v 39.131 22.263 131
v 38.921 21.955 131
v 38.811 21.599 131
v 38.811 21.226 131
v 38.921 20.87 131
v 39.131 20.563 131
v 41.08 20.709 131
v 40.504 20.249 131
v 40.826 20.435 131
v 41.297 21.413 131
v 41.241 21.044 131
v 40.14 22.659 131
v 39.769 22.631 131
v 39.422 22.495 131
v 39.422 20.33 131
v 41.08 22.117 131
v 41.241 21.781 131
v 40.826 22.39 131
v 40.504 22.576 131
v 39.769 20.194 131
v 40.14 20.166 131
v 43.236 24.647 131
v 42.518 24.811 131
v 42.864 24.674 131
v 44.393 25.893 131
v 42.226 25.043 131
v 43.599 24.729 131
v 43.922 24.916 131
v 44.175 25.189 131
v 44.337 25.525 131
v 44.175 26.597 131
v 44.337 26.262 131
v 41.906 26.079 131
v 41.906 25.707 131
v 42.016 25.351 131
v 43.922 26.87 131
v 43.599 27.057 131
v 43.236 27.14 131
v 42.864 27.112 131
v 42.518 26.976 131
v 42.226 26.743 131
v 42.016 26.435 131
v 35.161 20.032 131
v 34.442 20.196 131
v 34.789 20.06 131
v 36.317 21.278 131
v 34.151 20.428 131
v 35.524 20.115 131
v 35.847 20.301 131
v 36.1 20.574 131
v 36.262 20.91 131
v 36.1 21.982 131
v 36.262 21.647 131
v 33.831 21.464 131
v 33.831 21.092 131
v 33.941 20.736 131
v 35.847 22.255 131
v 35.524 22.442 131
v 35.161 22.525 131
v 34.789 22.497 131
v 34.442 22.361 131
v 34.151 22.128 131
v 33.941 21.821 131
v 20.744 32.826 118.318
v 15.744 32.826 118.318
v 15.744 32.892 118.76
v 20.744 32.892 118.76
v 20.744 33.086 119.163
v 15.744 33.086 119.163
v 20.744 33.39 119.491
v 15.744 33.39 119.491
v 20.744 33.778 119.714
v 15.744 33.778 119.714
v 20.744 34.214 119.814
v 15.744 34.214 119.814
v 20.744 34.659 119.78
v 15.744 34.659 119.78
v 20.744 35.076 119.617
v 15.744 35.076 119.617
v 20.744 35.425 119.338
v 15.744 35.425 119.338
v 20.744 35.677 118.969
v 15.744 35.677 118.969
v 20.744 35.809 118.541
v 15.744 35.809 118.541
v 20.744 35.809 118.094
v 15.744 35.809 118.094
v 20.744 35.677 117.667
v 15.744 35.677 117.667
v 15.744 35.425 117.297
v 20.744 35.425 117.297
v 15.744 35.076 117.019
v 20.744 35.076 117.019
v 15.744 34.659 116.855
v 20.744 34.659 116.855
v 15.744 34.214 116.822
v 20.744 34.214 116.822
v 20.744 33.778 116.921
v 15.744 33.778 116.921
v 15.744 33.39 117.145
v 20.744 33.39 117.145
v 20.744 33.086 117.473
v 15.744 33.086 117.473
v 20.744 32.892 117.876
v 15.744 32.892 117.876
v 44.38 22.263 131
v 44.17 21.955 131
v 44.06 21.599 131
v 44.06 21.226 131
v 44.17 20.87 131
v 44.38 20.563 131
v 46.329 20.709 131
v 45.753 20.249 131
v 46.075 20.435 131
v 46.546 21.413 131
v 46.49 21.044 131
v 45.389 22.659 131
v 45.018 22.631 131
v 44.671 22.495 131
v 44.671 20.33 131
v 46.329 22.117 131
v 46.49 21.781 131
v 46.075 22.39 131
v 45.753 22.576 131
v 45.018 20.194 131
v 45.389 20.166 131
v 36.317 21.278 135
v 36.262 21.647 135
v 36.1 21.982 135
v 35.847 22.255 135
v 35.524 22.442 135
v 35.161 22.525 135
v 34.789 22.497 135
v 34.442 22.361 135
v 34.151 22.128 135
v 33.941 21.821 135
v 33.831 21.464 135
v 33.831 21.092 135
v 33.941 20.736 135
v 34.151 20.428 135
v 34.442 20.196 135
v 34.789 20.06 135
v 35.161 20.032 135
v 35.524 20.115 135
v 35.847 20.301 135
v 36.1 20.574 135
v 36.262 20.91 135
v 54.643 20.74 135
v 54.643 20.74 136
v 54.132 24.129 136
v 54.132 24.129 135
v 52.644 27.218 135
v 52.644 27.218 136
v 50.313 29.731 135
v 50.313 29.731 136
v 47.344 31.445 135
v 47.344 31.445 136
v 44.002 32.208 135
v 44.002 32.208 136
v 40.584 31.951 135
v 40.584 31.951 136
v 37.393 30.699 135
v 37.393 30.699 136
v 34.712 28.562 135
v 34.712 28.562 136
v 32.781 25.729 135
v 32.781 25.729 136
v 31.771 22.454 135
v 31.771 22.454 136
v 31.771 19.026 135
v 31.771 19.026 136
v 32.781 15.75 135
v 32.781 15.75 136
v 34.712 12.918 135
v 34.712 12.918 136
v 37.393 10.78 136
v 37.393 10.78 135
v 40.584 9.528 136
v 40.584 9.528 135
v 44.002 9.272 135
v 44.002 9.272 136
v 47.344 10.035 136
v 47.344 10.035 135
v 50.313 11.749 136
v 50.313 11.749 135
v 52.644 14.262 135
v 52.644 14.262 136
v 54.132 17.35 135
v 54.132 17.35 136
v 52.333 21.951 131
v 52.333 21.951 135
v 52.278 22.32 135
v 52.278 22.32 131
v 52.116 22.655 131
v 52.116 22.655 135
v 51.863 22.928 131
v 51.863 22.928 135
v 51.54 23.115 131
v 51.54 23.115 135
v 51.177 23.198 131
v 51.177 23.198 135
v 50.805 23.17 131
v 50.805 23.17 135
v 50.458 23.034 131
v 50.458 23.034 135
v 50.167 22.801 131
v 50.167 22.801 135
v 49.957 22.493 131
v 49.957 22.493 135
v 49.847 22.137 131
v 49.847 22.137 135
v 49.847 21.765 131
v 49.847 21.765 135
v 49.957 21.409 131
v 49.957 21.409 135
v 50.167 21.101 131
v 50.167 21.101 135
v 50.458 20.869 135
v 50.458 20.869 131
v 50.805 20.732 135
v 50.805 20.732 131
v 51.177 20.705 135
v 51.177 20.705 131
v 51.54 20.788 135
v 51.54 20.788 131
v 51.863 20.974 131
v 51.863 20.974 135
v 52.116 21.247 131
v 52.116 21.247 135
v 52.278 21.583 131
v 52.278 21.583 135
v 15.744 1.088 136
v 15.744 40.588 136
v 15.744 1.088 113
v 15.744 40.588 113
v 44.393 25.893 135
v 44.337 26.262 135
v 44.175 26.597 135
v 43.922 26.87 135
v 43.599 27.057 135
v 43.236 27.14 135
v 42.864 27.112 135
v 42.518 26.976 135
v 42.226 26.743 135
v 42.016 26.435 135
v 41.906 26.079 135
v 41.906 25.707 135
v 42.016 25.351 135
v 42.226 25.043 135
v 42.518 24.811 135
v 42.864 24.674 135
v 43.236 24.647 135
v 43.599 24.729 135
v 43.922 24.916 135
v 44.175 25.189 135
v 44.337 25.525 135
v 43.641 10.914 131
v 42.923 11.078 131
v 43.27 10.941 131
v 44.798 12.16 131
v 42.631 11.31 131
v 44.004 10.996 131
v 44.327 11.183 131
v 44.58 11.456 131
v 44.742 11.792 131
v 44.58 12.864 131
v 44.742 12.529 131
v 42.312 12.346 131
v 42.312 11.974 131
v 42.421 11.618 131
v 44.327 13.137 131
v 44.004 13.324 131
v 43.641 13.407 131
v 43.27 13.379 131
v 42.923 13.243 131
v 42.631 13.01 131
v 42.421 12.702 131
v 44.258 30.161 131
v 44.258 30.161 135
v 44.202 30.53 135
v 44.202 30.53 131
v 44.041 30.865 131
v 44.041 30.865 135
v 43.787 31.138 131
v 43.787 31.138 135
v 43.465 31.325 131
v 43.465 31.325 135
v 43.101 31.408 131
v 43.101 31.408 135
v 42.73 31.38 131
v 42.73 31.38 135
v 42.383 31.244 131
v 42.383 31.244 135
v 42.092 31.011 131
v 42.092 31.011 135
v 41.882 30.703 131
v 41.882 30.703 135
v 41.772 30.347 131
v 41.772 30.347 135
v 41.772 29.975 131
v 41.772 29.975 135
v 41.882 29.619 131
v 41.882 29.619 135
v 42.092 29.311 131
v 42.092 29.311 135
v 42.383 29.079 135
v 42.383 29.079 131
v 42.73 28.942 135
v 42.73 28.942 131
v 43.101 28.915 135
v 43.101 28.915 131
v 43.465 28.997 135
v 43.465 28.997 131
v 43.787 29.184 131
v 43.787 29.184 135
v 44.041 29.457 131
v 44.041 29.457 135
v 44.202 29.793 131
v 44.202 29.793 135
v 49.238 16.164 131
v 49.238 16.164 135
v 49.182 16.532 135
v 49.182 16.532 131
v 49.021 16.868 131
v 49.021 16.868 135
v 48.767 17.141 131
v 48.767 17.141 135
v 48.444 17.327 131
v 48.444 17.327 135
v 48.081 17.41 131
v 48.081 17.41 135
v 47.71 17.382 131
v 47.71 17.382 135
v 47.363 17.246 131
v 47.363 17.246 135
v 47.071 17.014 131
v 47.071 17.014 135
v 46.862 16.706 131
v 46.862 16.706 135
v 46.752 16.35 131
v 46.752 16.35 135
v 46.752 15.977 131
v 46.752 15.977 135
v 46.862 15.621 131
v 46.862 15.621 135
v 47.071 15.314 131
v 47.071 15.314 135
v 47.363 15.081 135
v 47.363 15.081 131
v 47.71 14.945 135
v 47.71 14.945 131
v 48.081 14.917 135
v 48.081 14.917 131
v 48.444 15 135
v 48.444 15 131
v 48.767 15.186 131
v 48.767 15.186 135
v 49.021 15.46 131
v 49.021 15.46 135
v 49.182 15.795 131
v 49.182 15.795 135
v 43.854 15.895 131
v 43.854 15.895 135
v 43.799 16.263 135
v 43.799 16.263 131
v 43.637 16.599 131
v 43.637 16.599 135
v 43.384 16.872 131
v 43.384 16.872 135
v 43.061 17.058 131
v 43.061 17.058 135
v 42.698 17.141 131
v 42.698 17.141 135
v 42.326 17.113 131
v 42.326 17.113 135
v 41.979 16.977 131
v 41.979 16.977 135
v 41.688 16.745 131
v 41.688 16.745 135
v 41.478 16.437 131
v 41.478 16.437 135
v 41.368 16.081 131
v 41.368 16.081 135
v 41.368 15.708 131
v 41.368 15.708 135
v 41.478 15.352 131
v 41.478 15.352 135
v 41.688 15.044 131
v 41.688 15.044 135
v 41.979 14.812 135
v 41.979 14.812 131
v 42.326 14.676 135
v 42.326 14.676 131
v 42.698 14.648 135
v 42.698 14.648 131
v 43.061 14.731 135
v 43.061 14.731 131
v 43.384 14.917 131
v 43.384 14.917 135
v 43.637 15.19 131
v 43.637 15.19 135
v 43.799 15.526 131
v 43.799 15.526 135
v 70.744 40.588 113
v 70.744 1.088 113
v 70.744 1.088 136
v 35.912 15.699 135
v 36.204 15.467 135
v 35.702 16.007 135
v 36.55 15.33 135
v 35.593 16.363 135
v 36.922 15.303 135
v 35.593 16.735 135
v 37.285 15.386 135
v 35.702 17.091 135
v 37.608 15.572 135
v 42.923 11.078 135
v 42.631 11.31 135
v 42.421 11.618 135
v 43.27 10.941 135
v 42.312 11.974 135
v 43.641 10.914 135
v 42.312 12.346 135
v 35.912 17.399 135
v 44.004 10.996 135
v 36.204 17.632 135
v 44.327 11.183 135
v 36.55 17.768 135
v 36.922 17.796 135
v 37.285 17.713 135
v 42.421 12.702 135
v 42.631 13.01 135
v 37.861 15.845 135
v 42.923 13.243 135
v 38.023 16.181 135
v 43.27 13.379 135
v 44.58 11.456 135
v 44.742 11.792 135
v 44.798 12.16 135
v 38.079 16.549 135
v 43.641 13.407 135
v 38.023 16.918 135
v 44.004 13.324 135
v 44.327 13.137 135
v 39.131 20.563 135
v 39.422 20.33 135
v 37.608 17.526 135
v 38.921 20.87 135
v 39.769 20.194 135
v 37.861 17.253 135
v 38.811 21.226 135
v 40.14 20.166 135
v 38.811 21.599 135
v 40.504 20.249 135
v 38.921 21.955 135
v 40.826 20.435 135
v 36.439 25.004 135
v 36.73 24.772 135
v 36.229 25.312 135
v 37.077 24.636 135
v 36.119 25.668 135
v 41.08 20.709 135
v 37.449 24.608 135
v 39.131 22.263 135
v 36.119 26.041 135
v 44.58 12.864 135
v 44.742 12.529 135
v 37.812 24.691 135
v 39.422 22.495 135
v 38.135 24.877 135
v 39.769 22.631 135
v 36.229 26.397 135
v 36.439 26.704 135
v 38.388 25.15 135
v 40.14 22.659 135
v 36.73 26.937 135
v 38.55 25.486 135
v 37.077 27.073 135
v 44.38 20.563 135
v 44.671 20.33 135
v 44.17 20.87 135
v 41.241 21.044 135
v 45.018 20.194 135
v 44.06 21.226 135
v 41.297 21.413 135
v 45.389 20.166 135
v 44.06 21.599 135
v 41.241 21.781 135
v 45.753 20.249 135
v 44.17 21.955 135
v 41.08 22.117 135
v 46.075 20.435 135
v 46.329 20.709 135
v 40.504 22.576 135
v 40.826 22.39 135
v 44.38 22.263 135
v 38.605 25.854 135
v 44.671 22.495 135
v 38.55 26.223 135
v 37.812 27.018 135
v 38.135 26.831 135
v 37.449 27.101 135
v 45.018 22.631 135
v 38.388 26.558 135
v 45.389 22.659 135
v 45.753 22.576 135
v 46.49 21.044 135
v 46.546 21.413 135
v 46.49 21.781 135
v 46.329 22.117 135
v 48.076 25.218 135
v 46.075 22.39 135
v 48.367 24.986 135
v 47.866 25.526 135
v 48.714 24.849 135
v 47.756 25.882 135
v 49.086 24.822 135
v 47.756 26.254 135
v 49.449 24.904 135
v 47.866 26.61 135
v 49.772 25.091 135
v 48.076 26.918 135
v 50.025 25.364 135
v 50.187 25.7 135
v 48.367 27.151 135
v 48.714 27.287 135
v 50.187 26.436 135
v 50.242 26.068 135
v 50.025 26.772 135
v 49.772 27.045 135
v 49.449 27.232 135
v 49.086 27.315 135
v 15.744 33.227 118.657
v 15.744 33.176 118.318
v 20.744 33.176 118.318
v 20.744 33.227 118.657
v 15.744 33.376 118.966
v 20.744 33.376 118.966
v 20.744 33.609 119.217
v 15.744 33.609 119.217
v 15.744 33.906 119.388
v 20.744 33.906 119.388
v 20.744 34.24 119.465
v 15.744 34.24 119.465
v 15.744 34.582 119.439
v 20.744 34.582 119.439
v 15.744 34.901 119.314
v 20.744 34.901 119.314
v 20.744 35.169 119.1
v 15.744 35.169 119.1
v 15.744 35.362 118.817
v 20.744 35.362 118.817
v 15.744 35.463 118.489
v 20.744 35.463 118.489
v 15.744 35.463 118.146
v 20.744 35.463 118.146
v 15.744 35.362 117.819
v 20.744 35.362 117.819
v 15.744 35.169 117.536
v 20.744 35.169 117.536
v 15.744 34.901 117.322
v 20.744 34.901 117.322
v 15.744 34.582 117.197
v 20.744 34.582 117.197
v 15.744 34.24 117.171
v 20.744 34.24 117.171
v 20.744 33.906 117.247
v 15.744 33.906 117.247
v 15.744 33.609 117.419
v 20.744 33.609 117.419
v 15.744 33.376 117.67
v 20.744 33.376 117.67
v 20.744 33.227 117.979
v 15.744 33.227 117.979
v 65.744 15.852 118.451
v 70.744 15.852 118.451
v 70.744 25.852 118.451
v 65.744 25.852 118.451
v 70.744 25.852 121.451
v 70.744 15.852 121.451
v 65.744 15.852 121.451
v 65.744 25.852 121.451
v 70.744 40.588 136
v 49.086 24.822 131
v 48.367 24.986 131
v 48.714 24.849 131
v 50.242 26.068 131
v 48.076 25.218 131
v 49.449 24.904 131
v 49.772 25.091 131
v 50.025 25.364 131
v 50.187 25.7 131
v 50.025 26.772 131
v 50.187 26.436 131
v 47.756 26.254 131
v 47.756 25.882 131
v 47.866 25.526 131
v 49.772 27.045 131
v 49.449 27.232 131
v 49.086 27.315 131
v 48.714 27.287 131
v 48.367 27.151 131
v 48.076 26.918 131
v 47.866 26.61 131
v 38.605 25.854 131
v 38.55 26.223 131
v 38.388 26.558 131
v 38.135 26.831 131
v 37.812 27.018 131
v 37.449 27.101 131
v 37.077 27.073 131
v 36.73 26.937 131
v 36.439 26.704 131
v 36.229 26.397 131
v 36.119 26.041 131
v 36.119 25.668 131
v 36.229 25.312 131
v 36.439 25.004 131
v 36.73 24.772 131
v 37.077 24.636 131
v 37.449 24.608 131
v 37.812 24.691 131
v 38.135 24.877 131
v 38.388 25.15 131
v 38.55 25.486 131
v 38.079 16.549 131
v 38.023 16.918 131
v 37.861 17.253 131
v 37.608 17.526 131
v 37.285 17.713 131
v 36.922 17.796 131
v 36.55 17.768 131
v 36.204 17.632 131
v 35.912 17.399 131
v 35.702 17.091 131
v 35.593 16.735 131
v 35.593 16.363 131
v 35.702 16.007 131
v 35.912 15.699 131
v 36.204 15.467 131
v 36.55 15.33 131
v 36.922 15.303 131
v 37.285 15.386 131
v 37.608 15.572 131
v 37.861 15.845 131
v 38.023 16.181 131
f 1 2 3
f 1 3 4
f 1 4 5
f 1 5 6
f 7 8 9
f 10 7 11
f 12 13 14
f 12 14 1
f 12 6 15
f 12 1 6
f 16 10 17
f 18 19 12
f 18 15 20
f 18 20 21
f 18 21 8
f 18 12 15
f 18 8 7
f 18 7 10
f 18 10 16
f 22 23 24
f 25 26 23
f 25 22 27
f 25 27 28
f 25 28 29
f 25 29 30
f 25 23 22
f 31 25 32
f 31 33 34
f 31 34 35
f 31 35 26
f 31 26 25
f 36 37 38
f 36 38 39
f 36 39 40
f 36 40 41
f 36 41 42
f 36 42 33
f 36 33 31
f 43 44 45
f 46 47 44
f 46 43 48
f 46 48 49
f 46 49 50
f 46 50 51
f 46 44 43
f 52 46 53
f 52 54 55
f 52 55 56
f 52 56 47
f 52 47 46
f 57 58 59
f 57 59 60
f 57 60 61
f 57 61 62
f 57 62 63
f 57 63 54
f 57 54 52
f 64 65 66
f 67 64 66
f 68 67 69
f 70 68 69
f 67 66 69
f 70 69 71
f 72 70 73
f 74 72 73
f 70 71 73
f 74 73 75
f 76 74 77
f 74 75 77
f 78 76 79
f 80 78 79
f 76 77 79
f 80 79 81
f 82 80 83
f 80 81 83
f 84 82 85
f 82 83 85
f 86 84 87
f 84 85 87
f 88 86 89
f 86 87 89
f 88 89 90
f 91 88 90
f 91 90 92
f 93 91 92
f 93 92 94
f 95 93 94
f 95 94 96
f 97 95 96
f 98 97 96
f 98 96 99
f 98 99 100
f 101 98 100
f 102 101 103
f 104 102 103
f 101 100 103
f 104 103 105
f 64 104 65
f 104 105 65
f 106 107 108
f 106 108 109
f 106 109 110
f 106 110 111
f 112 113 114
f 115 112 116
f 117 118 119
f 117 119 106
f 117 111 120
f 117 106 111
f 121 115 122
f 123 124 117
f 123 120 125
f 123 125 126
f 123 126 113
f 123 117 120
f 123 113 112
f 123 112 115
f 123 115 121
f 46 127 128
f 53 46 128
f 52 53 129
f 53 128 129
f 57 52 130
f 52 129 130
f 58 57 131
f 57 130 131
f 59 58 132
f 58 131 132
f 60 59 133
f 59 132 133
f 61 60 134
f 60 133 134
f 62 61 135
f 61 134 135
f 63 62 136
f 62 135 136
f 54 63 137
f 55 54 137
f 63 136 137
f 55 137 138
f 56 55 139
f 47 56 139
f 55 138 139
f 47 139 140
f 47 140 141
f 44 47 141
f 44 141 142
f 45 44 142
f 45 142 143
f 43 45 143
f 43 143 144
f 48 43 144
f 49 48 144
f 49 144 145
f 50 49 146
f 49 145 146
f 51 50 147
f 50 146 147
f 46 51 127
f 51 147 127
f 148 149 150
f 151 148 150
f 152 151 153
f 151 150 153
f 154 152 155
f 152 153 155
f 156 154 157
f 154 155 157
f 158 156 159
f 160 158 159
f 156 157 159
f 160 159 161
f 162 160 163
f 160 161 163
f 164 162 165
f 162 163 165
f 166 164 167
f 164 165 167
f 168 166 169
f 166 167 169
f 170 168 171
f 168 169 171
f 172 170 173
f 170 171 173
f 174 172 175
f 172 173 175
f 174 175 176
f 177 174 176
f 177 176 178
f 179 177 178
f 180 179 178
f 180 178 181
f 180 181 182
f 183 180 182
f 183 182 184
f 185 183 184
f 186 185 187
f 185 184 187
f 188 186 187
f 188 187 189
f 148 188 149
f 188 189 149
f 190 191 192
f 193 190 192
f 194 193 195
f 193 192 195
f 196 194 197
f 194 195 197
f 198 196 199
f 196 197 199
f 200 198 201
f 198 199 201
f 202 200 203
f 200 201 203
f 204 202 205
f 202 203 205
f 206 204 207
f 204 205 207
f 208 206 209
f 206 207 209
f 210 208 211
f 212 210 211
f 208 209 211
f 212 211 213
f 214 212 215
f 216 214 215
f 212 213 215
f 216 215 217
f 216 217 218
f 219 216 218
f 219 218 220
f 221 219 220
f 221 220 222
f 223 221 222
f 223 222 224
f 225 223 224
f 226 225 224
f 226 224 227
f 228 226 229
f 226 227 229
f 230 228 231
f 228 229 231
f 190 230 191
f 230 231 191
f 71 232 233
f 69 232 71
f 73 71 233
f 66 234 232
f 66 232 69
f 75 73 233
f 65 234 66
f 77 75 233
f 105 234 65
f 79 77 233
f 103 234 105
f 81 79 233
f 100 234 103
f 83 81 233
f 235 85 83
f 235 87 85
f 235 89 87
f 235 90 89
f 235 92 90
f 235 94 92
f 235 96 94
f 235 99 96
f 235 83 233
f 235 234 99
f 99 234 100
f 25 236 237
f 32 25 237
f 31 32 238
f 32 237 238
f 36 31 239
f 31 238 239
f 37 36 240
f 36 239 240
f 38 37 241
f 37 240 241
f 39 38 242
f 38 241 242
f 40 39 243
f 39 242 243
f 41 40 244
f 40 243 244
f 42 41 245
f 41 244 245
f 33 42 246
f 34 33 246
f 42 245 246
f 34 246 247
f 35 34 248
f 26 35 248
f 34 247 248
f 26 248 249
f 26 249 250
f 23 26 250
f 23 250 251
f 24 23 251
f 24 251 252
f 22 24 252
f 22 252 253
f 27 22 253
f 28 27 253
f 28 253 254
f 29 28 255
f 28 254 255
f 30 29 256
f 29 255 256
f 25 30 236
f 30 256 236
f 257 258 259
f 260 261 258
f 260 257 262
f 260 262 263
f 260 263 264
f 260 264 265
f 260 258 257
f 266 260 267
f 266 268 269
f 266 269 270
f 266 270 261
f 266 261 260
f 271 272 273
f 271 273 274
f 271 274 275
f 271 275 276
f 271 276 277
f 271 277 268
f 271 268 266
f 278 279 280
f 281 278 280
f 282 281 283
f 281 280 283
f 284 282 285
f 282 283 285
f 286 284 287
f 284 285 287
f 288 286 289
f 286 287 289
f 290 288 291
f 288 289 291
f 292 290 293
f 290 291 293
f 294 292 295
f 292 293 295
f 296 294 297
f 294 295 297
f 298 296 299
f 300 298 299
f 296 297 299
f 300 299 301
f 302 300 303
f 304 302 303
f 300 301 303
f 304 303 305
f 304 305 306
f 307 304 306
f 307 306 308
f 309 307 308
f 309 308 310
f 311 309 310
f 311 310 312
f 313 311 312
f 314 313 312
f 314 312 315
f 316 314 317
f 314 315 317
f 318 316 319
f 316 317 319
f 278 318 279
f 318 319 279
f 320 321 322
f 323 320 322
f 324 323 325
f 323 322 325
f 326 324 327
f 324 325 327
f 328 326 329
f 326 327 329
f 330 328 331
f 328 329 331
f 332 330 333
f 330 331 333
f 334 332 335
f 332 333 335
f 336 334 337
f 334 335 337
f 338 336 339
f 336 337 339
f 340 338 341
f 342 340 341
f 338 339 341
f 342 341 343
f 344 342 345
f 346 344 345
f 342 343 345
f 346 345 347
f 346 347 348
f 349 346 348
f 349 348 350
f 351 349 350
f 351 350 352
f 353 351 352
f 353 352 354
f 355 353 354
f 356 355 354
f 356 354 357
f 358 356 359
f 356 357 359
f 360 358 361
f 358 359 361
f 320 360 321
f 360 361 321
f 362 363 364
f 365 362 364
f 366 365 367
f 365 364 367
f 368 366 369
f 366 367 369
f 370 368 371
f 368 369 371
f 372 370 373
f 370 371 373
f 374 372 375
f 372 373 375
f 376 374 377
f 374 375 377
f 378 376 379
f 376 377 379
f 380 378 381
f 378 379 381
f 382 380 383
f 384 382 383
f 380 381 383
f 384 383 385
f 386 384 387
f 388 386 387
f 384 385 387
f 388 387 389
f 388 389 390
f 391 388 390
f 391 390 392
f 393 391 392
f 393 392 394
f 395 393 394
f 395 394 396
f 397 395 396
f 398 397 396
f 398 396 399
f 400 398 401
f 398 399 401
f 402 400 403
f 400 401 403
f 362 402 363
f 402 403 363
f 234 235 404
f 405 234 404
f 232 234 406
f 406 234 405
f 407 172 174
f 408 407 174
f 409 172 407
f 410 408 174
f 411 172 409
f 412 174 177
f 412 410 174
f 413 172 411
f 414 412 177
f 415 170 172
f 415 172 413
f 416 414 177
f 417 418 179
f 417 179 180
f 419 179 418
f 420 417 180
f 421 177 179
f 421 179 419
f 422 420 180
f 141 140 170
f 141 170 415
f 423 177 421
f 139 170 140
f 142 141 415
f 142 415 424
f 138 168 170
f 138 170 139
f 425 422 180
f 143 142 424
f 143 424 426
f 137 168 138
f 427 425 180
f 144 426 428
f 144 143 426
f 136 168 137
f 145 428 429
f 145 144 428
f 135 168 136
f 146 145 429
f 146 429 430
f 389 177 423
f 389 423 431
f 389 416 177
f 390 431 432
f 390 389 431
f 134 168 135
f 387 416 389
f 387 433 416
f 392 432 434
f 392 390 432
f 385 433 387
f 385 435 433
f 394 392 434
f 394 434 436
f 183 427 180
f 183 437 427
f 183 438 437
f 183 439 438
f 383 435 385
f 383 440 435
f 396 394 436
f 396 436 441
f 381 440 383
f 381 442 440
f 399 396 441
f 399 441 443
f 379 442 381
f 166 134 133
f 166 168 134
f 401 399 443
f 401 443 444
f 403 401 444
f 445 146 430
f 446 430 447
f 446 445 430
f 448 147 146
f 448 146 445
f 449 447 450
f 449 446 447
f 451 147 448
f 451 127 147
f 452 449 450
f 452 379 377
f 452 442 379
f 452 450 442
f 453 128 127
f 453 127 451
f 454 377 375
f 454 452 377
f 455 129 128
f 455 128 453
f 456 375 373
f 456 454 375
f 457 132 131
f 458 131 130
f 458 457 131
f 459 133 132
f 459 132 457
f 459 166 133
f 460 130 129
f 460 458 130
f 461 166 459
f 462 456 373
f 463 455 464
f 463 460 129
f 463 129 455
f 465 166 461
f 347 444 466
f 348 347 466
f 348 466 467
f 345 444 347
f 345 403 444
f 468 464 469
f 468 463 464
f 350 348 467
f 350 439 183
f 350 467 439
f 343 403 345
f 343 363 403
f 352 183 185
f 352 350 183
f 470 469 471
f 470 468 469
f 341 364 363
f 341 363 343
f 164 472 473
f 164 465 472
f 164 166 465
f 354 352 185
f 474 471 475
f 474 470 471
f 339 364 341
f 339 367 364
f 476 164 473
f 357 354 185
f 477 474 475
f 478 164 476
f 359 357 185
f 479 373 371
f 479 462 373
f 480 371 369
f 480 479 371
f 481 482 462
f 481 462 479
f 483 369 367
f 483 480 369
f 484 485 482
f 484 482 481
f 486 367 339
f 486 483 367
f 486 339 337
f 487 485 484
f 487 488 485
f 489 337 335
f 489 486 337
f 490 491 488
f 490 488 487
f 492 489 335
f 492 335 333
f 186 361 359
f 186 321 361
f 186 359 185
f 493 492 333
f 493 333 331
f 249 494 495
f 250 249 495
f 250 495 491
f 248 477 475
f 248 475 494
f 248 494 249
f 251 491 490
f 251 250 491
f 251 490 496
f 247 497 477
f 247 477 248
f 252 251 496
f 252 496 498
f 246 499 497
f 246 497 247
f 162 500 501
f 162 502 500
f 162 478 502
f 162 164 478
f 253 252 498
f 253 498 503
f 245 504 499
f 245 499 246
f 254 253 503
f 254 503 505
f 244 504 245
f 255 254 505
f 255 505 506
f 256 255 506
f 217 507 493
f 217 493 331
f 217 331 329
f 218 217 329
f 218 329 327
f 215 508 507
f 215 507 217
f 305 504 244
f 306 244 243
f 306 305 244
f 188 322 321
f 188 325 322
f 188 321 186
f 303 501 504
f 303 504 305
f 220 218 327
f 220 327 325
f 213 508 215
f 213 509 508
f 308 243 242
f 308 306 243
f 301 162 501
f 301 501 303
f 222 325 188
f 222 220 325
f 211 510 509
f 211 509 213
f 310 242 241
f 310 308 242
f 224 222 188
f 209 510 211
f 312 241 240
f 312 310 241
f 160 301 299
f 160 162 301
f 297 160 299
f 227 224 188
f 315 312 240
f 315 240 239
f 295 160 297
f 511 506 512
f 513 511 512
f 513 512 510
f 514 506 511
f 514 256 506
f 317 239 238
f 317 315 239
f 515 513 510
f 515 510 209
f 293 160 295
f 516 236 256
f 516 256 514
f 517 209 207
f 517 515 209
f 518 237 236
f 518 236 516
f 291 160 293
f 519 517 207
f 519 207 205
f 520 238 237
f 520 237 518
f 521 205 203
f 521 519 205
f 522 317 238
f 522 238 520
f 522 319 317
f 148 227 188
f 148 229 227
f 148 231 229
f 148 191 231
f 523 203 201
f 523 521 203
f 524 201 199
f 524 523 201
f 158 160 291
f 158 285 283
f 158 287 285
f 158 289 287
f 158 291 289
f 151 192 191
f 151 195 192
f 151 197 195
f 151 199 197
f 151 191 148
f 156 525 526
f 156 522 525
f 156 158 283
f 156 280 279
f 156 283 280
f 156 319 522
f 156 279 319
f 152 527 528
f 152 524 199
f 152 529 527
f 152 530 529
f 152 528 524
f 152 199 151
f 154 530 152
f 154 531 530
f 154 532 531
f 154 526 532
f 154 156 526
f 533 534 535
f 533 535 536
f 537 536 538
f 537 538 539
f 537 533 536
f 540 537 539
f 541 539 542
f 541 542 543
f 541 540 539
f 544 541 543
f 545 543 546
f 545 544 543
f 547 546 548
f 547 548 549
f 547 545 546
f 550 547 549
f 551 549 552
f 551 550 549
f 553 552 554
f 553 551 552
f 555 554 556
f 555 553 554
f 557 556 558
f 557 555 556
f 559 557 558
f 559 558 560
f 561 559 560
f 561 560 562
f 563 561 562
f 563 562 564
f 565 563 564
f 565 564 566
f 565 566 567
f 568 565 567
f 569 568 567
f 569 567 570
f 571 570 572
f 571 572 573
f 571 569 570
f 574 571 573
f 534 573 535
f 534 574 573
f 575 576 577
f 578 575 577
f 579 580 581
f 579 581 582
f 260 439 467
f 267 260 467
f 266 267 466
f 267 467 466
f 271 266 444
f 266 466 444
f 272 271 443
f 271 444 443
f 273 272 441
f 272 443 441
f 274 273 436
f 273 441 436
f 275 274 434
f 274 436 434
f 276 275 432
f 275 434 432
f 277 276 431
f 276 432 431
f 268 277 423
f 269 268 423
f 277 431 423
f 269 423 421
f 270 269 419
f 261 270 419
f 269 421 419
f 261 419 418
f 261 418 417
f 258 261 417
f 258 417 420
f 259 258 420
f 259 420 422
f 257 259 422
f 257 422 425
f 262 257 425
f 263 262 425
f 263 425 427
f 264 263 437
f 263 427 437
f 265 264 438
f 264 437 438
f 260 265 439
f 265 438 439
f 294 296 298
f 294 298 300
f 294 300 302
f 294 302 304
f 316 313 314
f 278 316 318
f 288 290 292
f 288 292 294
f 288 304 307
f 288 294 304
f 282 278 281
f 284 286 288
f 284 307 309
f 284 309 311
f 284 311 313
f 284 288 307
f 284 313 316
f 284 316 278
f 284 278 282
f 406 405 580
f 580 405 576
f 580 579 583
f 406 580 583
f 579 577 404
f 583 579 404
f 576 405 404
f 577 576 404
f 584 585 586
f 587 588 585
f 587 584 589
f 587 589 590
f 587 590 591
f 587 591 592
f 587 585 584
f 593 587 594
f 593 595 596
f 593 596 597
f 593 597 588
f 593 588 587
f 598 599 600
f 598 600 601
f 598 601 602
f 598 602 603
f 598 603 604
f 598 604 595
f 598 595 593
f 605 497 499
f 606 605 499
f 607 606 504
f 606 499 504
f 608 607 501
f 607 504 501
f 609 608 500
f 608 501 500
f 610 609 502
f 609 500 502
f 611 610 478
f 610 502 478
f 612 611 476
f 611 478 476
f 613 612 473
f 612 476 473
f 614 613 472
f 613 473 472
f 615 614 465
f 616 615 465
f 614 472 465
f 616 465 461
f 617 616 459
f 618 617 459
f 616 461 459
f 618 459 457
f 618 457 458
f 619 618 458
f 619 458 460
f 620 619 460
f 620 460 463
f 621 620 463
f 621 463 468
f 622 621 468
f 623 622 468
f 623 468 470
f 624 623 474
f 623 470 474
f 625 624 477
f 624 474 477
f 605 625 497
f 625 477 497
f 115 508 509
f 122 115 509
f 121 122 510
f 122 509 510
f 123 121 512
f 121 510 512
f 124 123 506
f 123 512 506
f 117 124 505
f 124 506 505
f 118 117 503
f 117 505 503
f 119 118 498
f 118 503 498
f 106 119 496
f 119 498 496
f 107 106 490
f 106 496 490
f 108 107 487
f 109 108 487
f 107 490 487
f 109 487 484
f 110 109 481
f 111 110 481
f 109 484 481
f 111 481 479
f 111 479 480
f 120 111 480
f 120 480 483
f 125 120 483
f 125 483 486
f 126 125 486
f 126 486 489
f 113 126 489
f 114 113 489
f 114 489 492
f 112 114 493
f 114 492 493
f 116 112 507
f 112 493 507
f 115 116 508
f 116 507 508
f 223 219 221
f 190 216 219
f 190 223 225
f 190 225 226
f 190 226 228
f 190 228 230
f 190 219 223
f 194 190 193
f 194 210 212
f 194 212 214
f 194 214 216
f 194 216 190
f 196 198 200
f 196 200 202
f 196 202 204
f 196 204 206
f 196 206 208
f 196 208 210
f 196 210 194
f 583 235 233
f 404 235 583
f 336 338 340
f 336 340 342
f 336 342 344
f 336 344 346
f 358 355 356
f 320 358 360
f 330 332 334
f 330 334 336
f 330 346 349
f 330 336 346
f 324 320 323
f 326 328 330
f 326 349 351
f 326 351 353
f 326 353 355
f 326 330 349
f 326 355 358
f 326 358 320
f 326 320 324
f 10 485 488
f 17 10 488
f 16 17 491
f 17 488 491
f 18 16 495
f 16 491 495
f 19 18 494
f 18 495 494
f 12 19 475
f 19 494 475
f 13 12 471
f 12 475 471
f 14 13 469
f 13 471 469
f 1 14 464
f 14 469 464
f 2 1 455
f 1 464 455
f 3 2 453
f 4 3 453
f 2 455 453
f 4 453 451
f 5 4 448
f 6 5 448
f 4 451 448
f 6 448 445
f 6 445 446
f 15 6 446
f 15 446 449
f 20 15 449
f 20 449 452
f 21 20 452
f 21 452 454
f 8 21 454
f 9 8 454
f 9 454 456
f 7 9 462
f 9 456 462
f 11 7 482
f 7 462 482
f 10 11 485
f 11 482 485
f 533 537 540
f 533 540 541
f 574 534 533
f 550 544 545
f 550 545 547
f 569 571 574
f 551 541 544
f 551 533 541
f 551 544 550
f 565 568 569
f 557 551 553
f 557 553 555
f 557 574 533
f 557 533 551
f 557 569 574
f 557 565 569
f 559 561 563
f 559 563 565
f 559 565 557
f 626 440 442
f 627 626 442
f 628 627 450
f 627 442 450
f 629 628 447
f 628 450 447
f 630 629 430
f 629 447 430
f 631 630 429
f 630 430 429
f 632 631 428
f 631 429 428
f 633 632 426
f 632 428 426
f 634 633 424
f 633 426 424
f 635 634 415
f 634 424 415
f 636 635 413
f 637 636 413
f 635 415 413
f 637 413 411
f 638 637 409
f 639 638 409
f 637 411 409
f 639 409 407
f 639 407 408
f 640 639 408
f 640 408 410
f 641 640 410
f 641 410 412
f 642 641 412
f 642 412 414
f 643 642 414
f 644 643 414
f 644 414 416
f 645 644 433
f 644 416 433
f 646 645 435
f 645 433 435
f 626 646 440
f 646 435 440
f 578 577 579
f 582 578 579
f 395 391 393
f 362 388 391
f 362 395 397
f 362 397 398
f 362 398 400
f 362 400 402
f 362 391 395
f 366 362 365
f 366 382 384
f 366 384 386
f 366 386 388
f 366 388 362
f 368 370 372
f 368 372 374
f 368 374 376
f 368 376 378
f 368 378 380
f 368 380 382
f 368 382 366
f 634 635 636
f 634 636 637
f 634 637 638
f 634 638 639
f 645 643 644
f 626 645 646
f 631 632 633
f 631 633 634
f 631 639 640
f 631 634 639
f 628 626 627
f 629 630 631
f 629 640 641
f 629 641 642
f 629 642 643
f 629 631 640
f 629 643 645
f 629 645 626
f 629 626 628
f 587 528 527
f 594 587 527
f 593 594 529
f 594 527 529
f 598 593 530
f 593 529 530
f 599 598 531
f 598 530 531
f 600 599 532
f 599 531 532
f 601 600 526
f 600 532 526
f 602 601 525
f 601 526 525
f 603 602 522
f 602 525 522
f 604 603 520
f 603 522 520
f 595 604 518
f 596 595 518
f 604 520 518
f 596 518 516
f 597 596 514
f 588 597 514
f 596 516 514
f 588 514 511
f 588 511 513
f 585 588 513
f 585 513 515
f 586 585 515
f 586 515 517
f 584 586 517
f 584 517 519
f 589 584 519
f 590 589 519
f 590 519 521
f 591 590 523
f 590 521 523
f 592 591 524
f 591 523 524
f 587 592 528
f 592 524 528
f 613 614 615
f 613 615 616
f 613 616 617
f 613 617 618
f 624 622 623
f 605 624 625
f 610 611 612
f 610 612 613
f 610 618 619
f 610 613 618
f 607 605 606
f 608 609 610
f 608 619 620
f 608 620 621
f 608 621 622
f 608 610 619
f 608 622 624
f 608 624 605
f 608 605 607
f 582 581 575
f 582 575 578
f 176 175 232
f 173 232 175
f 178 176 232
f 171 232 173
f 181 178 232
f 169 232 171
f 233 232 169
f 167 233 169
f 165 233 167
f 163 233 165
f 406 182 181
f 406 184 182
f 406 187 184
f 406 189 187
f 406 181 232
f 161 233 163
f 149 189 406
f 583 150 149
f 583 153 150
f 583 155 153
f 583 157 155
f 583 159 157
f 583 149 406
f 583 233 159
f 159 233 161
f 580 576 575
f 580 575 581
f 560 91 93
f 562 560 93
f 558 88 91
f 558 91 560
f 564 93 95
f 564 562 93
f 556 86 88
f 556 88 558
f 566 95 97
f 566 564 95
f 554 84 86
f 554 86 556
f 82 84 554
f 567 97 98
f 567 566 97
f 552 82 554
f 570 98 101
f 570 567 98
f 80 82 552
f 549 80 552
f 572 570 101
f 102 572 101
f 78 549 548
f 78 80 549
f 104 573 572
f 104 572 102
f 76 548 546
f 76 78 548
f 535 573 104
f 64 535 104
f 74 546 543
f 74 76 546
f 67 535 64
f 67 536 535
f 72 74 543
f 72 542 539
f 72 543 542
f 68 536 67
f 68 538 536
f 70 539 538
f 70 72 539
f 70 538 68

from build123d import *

# Parameters (mm, degrees)
SKETCH057_W     = 55
SKETCH057_H     = 39.5
PAD028_DEPTH    = 23
SKETCH058_W     = 10
SKETCH058_H     = 3
POCKET011_DEPTH = 5
SKETCH059_R     = 11.5
POCKET012_DEPTH = 1
SKETCH060_R     = 1.25
POCKET013_DEPTH = 4
SKETCH061_R     = 1.5
SKETCH061_R_2   = 1.15
POCKET014_DEPTH = 5


with BuildPart() as part:
    # Sketch057 → Pad028 (new body)
    with BuildSketch(Plane.XY):
        with Locations((8.244135, 0.838188)):
            Rectangle(SKETCH057_W, SKETCH057_H)
    extrude(amount=PAD028_DEPTH)

    # Sketch058 (on Face3 of Pad028) → Pocket011 (cut)
    with BuildSketch(Plane.YZ.offset(35.744135)):
        with Locations((0.852094, 6.951404)):
            Rectangle(SKETCH058_W, SKETCH058_H)
    extrude(amount=-POCKET011_DEPTH, mode=Mode.SUBTRACT)

    # Sketch059 (on Face5 of Pocket011) → Pocket012 (cut)
    with BuildSketch(Plane.XY.offset(23)):
        with Locations((8.142509, 0.739769)):
            Circle(SKETCH059_R)
    extrude(amount=-POCKET012_DEPTH, mode=Mode.SUBTRACT)

    # Sketch060 (on Face12 of Pocket012) → Pocket013 (cut)
    with BuildSketch(Plane.XY.offset(22)):
        with Locations((2.355179, 5.854206)):
            Circle(SKETCH060_R)
        with Locations((8.142534, 5.893073)):
            Circle(SKETCH060_R)
        with Locations((13.992255, 6.068044)):
            Circle(SKETCH060_R)
        with Locations((0.067154, 1.278166)):
            Circle(SKETCH060_R)
        with Locations((5.046978, 1.412754)):
            Circle(SKETCH060_R)
        with Locations((10.295966, 1.412754)):
            Circle(SKETCH060_R)
        with Locations((1.82863, -3.450897)):
            Circle(SKETCH060_R)
        with Locations((7.604173, -4.105418)):
            Circle(SKETCH060_R)
        with Locations((12.987754, -3.836237)):
            Circle(SKETCH060_R)
        with Locations((8.547656, -7.839936)):
            Circle(SKETCH060_R)
        with Locations((8.00794, 10.161071)):
            Circle(SKETCH060_R)
        with Locations((16.083309, 1.951109)):
            Circle(SKETCH060_R)
    extrude(amount=-POCKET013_DEPTH, mode=Mode.SUBTRACT)

    # Sketch061 (on Face1 of Pocket013) → Pocket014 (cut)
    with BuildSketch(Plane(origin=(-19.255865, 0, 0), x_dir=(0, -1, 0), z_dir=(-1, 0, 0))):
        with Locations((-14.325696, 5.317757)):
            Circle(SKETCH061_R)
        with Locations((-14.325696, 5.317757)):
            Circle(SKETCH061_R_2, mode=Mode.SUBTRACT)
    extrude(amount=-POCKET014_DEPTH, mode=Mode.SUBTRACT)


with BuildPart() as part_1:
    # Body009 placement: moved
    add(part.part.moved(Location((35, 20, 113))))


solid = part_1.part
